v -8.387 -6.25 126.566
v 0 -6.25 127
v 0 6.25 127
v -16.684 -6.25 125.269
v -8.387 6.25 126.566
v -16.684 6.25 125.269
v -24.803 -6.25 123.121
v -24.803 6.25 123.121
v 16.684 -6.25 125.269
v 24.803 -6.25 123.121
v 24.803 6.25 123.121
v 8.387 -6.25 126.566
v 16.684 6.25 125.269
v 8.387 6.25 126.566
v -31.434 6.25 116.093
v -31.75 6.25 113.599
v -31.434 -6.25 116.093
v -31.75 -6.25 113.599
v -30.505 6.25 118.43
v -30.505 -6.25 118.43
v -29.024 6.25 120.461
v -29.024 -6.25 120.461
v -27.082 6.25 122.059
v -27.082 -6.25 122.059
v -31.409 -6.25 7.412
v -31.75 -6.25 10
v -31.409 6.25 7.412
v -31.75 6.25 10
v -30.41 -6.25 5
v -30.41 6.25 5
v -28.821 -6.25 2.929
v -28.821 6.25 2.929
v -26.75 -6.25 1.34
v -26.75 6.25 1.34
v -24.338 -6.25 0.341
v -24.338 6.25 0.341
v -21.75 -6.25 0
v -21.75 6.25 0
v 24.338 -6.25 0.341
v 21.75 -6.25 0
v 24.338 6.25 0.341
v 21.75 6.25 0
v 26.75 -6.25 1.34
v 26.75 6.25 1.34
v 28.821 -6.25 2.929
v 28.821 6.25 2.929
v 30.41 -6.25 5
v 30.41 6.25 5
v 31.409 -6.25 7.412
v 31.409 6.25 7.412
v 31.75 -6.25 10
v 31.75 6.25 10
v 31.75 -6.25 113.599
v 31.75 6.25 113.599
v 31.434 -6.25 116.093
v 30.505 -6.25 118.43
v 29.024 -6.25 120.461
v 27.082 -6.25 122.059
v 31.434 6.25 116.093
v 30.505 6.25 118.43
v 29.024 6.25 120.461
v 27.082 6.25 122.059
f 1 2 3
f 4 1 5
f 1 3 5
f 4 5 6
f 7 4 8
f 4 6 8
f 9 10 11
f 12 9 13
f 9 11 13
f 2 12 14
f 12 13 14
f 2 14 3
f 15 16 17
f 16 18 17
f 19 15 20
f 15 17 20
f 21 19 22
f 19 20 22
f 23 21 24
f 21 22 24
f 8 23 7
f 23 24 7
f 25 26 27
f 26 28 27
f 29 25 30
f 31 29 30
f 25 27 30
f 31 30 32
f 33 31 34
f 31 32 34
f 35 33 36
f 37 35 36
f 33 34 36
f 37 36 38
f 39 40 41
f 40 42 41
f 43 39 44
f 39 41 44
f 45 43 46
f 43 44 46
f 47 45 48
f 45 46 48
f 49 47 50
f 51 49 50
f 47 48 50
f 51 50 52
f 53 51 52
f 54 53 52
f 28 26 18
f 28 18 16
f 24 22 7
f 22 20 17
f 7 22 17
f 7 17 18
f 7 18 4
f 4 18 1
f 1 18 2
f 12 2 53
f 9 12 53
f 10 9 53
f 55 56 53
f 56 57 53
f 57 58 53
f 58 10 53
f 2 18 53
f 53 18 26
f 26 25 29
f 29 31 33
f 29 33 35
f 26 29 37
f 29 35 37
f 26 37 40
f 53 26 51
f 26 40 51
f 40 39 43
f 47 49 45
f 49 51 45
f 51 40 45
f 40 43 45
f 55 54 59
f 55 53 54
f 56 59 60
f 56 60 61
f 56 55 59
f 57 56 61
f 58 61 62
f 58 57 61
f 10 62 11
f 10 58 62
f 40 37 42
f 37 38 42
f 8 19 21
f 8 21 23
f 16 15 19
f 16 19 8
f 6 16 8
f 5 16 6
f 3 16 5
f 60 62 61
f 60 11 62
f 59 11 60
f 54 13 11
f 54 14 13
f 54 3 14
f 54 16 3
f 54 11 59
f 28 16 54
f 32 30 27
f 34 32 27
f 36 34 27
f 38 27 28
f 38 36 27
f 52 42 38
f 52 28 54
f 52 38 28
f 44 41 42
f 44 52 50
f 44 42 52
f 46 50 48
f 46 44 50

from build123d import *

# Parameters (mm, degrees)
CROQUIS1_W              = 63.5
CROQUIS1_H              = 12.5
SALIENTE_EXTRUIR1_DEPTH = 127
CORTAR_EXTRUIR1_DEPTH   = 127
REDONDEO1_R             = 10


with BuildPart() as part:
    # Croquis1 → Saliente-Extruir1 (new body)
    with BuildSketch(Plane.XY):
        Rectangle(CROQUIS1_W, CROQUIS1_H)
    extrude(amount=SALIENTE_EXTRUIR1_DEPTH)

    # Croquis2 → Cortar-Extruir1 (cut)
    with BuildSketch(Plane(origin=(0, 6.25, 0), x_dir=(1, 0, 0), z_dir=(0, 1, 0))):
        with BuildLine():
            ThreePointArc((0, -127), (-16.200333365, -125.368441446), (-31.75, -120.539295353))
            Line((-31.75, -120.539295353), (-31.75, -127))
            Line((-31.75, -127), (0, -127))
        make_face()
        with BuildLine():
            ThreePointArc((31.75, -120.539295353), (16.200333365, -125.368441446), (0, -127))
            Line((0, -127), (31.75, -127))
            Line((31.75, -127), (31.75, -120.539295353))
        make_face()
    extrude(amount=-CORTAR_EXTRUIR1_DEPTH, mode=Mode.SUBTRACT)

    # Redondeo1
    redondeo1_edges = [part.edges().sort_by_distance(p)[0] for p in [
        (-31.75, 0, 120.539295353),
        (31.75, 0, 120.539295353),
        (-31.75, 0, 0),
        (31.75, 0, 0),
    ]]
    fillet(redondeo1_edges, radius=REDONDEO1_R)


solid = part.part
